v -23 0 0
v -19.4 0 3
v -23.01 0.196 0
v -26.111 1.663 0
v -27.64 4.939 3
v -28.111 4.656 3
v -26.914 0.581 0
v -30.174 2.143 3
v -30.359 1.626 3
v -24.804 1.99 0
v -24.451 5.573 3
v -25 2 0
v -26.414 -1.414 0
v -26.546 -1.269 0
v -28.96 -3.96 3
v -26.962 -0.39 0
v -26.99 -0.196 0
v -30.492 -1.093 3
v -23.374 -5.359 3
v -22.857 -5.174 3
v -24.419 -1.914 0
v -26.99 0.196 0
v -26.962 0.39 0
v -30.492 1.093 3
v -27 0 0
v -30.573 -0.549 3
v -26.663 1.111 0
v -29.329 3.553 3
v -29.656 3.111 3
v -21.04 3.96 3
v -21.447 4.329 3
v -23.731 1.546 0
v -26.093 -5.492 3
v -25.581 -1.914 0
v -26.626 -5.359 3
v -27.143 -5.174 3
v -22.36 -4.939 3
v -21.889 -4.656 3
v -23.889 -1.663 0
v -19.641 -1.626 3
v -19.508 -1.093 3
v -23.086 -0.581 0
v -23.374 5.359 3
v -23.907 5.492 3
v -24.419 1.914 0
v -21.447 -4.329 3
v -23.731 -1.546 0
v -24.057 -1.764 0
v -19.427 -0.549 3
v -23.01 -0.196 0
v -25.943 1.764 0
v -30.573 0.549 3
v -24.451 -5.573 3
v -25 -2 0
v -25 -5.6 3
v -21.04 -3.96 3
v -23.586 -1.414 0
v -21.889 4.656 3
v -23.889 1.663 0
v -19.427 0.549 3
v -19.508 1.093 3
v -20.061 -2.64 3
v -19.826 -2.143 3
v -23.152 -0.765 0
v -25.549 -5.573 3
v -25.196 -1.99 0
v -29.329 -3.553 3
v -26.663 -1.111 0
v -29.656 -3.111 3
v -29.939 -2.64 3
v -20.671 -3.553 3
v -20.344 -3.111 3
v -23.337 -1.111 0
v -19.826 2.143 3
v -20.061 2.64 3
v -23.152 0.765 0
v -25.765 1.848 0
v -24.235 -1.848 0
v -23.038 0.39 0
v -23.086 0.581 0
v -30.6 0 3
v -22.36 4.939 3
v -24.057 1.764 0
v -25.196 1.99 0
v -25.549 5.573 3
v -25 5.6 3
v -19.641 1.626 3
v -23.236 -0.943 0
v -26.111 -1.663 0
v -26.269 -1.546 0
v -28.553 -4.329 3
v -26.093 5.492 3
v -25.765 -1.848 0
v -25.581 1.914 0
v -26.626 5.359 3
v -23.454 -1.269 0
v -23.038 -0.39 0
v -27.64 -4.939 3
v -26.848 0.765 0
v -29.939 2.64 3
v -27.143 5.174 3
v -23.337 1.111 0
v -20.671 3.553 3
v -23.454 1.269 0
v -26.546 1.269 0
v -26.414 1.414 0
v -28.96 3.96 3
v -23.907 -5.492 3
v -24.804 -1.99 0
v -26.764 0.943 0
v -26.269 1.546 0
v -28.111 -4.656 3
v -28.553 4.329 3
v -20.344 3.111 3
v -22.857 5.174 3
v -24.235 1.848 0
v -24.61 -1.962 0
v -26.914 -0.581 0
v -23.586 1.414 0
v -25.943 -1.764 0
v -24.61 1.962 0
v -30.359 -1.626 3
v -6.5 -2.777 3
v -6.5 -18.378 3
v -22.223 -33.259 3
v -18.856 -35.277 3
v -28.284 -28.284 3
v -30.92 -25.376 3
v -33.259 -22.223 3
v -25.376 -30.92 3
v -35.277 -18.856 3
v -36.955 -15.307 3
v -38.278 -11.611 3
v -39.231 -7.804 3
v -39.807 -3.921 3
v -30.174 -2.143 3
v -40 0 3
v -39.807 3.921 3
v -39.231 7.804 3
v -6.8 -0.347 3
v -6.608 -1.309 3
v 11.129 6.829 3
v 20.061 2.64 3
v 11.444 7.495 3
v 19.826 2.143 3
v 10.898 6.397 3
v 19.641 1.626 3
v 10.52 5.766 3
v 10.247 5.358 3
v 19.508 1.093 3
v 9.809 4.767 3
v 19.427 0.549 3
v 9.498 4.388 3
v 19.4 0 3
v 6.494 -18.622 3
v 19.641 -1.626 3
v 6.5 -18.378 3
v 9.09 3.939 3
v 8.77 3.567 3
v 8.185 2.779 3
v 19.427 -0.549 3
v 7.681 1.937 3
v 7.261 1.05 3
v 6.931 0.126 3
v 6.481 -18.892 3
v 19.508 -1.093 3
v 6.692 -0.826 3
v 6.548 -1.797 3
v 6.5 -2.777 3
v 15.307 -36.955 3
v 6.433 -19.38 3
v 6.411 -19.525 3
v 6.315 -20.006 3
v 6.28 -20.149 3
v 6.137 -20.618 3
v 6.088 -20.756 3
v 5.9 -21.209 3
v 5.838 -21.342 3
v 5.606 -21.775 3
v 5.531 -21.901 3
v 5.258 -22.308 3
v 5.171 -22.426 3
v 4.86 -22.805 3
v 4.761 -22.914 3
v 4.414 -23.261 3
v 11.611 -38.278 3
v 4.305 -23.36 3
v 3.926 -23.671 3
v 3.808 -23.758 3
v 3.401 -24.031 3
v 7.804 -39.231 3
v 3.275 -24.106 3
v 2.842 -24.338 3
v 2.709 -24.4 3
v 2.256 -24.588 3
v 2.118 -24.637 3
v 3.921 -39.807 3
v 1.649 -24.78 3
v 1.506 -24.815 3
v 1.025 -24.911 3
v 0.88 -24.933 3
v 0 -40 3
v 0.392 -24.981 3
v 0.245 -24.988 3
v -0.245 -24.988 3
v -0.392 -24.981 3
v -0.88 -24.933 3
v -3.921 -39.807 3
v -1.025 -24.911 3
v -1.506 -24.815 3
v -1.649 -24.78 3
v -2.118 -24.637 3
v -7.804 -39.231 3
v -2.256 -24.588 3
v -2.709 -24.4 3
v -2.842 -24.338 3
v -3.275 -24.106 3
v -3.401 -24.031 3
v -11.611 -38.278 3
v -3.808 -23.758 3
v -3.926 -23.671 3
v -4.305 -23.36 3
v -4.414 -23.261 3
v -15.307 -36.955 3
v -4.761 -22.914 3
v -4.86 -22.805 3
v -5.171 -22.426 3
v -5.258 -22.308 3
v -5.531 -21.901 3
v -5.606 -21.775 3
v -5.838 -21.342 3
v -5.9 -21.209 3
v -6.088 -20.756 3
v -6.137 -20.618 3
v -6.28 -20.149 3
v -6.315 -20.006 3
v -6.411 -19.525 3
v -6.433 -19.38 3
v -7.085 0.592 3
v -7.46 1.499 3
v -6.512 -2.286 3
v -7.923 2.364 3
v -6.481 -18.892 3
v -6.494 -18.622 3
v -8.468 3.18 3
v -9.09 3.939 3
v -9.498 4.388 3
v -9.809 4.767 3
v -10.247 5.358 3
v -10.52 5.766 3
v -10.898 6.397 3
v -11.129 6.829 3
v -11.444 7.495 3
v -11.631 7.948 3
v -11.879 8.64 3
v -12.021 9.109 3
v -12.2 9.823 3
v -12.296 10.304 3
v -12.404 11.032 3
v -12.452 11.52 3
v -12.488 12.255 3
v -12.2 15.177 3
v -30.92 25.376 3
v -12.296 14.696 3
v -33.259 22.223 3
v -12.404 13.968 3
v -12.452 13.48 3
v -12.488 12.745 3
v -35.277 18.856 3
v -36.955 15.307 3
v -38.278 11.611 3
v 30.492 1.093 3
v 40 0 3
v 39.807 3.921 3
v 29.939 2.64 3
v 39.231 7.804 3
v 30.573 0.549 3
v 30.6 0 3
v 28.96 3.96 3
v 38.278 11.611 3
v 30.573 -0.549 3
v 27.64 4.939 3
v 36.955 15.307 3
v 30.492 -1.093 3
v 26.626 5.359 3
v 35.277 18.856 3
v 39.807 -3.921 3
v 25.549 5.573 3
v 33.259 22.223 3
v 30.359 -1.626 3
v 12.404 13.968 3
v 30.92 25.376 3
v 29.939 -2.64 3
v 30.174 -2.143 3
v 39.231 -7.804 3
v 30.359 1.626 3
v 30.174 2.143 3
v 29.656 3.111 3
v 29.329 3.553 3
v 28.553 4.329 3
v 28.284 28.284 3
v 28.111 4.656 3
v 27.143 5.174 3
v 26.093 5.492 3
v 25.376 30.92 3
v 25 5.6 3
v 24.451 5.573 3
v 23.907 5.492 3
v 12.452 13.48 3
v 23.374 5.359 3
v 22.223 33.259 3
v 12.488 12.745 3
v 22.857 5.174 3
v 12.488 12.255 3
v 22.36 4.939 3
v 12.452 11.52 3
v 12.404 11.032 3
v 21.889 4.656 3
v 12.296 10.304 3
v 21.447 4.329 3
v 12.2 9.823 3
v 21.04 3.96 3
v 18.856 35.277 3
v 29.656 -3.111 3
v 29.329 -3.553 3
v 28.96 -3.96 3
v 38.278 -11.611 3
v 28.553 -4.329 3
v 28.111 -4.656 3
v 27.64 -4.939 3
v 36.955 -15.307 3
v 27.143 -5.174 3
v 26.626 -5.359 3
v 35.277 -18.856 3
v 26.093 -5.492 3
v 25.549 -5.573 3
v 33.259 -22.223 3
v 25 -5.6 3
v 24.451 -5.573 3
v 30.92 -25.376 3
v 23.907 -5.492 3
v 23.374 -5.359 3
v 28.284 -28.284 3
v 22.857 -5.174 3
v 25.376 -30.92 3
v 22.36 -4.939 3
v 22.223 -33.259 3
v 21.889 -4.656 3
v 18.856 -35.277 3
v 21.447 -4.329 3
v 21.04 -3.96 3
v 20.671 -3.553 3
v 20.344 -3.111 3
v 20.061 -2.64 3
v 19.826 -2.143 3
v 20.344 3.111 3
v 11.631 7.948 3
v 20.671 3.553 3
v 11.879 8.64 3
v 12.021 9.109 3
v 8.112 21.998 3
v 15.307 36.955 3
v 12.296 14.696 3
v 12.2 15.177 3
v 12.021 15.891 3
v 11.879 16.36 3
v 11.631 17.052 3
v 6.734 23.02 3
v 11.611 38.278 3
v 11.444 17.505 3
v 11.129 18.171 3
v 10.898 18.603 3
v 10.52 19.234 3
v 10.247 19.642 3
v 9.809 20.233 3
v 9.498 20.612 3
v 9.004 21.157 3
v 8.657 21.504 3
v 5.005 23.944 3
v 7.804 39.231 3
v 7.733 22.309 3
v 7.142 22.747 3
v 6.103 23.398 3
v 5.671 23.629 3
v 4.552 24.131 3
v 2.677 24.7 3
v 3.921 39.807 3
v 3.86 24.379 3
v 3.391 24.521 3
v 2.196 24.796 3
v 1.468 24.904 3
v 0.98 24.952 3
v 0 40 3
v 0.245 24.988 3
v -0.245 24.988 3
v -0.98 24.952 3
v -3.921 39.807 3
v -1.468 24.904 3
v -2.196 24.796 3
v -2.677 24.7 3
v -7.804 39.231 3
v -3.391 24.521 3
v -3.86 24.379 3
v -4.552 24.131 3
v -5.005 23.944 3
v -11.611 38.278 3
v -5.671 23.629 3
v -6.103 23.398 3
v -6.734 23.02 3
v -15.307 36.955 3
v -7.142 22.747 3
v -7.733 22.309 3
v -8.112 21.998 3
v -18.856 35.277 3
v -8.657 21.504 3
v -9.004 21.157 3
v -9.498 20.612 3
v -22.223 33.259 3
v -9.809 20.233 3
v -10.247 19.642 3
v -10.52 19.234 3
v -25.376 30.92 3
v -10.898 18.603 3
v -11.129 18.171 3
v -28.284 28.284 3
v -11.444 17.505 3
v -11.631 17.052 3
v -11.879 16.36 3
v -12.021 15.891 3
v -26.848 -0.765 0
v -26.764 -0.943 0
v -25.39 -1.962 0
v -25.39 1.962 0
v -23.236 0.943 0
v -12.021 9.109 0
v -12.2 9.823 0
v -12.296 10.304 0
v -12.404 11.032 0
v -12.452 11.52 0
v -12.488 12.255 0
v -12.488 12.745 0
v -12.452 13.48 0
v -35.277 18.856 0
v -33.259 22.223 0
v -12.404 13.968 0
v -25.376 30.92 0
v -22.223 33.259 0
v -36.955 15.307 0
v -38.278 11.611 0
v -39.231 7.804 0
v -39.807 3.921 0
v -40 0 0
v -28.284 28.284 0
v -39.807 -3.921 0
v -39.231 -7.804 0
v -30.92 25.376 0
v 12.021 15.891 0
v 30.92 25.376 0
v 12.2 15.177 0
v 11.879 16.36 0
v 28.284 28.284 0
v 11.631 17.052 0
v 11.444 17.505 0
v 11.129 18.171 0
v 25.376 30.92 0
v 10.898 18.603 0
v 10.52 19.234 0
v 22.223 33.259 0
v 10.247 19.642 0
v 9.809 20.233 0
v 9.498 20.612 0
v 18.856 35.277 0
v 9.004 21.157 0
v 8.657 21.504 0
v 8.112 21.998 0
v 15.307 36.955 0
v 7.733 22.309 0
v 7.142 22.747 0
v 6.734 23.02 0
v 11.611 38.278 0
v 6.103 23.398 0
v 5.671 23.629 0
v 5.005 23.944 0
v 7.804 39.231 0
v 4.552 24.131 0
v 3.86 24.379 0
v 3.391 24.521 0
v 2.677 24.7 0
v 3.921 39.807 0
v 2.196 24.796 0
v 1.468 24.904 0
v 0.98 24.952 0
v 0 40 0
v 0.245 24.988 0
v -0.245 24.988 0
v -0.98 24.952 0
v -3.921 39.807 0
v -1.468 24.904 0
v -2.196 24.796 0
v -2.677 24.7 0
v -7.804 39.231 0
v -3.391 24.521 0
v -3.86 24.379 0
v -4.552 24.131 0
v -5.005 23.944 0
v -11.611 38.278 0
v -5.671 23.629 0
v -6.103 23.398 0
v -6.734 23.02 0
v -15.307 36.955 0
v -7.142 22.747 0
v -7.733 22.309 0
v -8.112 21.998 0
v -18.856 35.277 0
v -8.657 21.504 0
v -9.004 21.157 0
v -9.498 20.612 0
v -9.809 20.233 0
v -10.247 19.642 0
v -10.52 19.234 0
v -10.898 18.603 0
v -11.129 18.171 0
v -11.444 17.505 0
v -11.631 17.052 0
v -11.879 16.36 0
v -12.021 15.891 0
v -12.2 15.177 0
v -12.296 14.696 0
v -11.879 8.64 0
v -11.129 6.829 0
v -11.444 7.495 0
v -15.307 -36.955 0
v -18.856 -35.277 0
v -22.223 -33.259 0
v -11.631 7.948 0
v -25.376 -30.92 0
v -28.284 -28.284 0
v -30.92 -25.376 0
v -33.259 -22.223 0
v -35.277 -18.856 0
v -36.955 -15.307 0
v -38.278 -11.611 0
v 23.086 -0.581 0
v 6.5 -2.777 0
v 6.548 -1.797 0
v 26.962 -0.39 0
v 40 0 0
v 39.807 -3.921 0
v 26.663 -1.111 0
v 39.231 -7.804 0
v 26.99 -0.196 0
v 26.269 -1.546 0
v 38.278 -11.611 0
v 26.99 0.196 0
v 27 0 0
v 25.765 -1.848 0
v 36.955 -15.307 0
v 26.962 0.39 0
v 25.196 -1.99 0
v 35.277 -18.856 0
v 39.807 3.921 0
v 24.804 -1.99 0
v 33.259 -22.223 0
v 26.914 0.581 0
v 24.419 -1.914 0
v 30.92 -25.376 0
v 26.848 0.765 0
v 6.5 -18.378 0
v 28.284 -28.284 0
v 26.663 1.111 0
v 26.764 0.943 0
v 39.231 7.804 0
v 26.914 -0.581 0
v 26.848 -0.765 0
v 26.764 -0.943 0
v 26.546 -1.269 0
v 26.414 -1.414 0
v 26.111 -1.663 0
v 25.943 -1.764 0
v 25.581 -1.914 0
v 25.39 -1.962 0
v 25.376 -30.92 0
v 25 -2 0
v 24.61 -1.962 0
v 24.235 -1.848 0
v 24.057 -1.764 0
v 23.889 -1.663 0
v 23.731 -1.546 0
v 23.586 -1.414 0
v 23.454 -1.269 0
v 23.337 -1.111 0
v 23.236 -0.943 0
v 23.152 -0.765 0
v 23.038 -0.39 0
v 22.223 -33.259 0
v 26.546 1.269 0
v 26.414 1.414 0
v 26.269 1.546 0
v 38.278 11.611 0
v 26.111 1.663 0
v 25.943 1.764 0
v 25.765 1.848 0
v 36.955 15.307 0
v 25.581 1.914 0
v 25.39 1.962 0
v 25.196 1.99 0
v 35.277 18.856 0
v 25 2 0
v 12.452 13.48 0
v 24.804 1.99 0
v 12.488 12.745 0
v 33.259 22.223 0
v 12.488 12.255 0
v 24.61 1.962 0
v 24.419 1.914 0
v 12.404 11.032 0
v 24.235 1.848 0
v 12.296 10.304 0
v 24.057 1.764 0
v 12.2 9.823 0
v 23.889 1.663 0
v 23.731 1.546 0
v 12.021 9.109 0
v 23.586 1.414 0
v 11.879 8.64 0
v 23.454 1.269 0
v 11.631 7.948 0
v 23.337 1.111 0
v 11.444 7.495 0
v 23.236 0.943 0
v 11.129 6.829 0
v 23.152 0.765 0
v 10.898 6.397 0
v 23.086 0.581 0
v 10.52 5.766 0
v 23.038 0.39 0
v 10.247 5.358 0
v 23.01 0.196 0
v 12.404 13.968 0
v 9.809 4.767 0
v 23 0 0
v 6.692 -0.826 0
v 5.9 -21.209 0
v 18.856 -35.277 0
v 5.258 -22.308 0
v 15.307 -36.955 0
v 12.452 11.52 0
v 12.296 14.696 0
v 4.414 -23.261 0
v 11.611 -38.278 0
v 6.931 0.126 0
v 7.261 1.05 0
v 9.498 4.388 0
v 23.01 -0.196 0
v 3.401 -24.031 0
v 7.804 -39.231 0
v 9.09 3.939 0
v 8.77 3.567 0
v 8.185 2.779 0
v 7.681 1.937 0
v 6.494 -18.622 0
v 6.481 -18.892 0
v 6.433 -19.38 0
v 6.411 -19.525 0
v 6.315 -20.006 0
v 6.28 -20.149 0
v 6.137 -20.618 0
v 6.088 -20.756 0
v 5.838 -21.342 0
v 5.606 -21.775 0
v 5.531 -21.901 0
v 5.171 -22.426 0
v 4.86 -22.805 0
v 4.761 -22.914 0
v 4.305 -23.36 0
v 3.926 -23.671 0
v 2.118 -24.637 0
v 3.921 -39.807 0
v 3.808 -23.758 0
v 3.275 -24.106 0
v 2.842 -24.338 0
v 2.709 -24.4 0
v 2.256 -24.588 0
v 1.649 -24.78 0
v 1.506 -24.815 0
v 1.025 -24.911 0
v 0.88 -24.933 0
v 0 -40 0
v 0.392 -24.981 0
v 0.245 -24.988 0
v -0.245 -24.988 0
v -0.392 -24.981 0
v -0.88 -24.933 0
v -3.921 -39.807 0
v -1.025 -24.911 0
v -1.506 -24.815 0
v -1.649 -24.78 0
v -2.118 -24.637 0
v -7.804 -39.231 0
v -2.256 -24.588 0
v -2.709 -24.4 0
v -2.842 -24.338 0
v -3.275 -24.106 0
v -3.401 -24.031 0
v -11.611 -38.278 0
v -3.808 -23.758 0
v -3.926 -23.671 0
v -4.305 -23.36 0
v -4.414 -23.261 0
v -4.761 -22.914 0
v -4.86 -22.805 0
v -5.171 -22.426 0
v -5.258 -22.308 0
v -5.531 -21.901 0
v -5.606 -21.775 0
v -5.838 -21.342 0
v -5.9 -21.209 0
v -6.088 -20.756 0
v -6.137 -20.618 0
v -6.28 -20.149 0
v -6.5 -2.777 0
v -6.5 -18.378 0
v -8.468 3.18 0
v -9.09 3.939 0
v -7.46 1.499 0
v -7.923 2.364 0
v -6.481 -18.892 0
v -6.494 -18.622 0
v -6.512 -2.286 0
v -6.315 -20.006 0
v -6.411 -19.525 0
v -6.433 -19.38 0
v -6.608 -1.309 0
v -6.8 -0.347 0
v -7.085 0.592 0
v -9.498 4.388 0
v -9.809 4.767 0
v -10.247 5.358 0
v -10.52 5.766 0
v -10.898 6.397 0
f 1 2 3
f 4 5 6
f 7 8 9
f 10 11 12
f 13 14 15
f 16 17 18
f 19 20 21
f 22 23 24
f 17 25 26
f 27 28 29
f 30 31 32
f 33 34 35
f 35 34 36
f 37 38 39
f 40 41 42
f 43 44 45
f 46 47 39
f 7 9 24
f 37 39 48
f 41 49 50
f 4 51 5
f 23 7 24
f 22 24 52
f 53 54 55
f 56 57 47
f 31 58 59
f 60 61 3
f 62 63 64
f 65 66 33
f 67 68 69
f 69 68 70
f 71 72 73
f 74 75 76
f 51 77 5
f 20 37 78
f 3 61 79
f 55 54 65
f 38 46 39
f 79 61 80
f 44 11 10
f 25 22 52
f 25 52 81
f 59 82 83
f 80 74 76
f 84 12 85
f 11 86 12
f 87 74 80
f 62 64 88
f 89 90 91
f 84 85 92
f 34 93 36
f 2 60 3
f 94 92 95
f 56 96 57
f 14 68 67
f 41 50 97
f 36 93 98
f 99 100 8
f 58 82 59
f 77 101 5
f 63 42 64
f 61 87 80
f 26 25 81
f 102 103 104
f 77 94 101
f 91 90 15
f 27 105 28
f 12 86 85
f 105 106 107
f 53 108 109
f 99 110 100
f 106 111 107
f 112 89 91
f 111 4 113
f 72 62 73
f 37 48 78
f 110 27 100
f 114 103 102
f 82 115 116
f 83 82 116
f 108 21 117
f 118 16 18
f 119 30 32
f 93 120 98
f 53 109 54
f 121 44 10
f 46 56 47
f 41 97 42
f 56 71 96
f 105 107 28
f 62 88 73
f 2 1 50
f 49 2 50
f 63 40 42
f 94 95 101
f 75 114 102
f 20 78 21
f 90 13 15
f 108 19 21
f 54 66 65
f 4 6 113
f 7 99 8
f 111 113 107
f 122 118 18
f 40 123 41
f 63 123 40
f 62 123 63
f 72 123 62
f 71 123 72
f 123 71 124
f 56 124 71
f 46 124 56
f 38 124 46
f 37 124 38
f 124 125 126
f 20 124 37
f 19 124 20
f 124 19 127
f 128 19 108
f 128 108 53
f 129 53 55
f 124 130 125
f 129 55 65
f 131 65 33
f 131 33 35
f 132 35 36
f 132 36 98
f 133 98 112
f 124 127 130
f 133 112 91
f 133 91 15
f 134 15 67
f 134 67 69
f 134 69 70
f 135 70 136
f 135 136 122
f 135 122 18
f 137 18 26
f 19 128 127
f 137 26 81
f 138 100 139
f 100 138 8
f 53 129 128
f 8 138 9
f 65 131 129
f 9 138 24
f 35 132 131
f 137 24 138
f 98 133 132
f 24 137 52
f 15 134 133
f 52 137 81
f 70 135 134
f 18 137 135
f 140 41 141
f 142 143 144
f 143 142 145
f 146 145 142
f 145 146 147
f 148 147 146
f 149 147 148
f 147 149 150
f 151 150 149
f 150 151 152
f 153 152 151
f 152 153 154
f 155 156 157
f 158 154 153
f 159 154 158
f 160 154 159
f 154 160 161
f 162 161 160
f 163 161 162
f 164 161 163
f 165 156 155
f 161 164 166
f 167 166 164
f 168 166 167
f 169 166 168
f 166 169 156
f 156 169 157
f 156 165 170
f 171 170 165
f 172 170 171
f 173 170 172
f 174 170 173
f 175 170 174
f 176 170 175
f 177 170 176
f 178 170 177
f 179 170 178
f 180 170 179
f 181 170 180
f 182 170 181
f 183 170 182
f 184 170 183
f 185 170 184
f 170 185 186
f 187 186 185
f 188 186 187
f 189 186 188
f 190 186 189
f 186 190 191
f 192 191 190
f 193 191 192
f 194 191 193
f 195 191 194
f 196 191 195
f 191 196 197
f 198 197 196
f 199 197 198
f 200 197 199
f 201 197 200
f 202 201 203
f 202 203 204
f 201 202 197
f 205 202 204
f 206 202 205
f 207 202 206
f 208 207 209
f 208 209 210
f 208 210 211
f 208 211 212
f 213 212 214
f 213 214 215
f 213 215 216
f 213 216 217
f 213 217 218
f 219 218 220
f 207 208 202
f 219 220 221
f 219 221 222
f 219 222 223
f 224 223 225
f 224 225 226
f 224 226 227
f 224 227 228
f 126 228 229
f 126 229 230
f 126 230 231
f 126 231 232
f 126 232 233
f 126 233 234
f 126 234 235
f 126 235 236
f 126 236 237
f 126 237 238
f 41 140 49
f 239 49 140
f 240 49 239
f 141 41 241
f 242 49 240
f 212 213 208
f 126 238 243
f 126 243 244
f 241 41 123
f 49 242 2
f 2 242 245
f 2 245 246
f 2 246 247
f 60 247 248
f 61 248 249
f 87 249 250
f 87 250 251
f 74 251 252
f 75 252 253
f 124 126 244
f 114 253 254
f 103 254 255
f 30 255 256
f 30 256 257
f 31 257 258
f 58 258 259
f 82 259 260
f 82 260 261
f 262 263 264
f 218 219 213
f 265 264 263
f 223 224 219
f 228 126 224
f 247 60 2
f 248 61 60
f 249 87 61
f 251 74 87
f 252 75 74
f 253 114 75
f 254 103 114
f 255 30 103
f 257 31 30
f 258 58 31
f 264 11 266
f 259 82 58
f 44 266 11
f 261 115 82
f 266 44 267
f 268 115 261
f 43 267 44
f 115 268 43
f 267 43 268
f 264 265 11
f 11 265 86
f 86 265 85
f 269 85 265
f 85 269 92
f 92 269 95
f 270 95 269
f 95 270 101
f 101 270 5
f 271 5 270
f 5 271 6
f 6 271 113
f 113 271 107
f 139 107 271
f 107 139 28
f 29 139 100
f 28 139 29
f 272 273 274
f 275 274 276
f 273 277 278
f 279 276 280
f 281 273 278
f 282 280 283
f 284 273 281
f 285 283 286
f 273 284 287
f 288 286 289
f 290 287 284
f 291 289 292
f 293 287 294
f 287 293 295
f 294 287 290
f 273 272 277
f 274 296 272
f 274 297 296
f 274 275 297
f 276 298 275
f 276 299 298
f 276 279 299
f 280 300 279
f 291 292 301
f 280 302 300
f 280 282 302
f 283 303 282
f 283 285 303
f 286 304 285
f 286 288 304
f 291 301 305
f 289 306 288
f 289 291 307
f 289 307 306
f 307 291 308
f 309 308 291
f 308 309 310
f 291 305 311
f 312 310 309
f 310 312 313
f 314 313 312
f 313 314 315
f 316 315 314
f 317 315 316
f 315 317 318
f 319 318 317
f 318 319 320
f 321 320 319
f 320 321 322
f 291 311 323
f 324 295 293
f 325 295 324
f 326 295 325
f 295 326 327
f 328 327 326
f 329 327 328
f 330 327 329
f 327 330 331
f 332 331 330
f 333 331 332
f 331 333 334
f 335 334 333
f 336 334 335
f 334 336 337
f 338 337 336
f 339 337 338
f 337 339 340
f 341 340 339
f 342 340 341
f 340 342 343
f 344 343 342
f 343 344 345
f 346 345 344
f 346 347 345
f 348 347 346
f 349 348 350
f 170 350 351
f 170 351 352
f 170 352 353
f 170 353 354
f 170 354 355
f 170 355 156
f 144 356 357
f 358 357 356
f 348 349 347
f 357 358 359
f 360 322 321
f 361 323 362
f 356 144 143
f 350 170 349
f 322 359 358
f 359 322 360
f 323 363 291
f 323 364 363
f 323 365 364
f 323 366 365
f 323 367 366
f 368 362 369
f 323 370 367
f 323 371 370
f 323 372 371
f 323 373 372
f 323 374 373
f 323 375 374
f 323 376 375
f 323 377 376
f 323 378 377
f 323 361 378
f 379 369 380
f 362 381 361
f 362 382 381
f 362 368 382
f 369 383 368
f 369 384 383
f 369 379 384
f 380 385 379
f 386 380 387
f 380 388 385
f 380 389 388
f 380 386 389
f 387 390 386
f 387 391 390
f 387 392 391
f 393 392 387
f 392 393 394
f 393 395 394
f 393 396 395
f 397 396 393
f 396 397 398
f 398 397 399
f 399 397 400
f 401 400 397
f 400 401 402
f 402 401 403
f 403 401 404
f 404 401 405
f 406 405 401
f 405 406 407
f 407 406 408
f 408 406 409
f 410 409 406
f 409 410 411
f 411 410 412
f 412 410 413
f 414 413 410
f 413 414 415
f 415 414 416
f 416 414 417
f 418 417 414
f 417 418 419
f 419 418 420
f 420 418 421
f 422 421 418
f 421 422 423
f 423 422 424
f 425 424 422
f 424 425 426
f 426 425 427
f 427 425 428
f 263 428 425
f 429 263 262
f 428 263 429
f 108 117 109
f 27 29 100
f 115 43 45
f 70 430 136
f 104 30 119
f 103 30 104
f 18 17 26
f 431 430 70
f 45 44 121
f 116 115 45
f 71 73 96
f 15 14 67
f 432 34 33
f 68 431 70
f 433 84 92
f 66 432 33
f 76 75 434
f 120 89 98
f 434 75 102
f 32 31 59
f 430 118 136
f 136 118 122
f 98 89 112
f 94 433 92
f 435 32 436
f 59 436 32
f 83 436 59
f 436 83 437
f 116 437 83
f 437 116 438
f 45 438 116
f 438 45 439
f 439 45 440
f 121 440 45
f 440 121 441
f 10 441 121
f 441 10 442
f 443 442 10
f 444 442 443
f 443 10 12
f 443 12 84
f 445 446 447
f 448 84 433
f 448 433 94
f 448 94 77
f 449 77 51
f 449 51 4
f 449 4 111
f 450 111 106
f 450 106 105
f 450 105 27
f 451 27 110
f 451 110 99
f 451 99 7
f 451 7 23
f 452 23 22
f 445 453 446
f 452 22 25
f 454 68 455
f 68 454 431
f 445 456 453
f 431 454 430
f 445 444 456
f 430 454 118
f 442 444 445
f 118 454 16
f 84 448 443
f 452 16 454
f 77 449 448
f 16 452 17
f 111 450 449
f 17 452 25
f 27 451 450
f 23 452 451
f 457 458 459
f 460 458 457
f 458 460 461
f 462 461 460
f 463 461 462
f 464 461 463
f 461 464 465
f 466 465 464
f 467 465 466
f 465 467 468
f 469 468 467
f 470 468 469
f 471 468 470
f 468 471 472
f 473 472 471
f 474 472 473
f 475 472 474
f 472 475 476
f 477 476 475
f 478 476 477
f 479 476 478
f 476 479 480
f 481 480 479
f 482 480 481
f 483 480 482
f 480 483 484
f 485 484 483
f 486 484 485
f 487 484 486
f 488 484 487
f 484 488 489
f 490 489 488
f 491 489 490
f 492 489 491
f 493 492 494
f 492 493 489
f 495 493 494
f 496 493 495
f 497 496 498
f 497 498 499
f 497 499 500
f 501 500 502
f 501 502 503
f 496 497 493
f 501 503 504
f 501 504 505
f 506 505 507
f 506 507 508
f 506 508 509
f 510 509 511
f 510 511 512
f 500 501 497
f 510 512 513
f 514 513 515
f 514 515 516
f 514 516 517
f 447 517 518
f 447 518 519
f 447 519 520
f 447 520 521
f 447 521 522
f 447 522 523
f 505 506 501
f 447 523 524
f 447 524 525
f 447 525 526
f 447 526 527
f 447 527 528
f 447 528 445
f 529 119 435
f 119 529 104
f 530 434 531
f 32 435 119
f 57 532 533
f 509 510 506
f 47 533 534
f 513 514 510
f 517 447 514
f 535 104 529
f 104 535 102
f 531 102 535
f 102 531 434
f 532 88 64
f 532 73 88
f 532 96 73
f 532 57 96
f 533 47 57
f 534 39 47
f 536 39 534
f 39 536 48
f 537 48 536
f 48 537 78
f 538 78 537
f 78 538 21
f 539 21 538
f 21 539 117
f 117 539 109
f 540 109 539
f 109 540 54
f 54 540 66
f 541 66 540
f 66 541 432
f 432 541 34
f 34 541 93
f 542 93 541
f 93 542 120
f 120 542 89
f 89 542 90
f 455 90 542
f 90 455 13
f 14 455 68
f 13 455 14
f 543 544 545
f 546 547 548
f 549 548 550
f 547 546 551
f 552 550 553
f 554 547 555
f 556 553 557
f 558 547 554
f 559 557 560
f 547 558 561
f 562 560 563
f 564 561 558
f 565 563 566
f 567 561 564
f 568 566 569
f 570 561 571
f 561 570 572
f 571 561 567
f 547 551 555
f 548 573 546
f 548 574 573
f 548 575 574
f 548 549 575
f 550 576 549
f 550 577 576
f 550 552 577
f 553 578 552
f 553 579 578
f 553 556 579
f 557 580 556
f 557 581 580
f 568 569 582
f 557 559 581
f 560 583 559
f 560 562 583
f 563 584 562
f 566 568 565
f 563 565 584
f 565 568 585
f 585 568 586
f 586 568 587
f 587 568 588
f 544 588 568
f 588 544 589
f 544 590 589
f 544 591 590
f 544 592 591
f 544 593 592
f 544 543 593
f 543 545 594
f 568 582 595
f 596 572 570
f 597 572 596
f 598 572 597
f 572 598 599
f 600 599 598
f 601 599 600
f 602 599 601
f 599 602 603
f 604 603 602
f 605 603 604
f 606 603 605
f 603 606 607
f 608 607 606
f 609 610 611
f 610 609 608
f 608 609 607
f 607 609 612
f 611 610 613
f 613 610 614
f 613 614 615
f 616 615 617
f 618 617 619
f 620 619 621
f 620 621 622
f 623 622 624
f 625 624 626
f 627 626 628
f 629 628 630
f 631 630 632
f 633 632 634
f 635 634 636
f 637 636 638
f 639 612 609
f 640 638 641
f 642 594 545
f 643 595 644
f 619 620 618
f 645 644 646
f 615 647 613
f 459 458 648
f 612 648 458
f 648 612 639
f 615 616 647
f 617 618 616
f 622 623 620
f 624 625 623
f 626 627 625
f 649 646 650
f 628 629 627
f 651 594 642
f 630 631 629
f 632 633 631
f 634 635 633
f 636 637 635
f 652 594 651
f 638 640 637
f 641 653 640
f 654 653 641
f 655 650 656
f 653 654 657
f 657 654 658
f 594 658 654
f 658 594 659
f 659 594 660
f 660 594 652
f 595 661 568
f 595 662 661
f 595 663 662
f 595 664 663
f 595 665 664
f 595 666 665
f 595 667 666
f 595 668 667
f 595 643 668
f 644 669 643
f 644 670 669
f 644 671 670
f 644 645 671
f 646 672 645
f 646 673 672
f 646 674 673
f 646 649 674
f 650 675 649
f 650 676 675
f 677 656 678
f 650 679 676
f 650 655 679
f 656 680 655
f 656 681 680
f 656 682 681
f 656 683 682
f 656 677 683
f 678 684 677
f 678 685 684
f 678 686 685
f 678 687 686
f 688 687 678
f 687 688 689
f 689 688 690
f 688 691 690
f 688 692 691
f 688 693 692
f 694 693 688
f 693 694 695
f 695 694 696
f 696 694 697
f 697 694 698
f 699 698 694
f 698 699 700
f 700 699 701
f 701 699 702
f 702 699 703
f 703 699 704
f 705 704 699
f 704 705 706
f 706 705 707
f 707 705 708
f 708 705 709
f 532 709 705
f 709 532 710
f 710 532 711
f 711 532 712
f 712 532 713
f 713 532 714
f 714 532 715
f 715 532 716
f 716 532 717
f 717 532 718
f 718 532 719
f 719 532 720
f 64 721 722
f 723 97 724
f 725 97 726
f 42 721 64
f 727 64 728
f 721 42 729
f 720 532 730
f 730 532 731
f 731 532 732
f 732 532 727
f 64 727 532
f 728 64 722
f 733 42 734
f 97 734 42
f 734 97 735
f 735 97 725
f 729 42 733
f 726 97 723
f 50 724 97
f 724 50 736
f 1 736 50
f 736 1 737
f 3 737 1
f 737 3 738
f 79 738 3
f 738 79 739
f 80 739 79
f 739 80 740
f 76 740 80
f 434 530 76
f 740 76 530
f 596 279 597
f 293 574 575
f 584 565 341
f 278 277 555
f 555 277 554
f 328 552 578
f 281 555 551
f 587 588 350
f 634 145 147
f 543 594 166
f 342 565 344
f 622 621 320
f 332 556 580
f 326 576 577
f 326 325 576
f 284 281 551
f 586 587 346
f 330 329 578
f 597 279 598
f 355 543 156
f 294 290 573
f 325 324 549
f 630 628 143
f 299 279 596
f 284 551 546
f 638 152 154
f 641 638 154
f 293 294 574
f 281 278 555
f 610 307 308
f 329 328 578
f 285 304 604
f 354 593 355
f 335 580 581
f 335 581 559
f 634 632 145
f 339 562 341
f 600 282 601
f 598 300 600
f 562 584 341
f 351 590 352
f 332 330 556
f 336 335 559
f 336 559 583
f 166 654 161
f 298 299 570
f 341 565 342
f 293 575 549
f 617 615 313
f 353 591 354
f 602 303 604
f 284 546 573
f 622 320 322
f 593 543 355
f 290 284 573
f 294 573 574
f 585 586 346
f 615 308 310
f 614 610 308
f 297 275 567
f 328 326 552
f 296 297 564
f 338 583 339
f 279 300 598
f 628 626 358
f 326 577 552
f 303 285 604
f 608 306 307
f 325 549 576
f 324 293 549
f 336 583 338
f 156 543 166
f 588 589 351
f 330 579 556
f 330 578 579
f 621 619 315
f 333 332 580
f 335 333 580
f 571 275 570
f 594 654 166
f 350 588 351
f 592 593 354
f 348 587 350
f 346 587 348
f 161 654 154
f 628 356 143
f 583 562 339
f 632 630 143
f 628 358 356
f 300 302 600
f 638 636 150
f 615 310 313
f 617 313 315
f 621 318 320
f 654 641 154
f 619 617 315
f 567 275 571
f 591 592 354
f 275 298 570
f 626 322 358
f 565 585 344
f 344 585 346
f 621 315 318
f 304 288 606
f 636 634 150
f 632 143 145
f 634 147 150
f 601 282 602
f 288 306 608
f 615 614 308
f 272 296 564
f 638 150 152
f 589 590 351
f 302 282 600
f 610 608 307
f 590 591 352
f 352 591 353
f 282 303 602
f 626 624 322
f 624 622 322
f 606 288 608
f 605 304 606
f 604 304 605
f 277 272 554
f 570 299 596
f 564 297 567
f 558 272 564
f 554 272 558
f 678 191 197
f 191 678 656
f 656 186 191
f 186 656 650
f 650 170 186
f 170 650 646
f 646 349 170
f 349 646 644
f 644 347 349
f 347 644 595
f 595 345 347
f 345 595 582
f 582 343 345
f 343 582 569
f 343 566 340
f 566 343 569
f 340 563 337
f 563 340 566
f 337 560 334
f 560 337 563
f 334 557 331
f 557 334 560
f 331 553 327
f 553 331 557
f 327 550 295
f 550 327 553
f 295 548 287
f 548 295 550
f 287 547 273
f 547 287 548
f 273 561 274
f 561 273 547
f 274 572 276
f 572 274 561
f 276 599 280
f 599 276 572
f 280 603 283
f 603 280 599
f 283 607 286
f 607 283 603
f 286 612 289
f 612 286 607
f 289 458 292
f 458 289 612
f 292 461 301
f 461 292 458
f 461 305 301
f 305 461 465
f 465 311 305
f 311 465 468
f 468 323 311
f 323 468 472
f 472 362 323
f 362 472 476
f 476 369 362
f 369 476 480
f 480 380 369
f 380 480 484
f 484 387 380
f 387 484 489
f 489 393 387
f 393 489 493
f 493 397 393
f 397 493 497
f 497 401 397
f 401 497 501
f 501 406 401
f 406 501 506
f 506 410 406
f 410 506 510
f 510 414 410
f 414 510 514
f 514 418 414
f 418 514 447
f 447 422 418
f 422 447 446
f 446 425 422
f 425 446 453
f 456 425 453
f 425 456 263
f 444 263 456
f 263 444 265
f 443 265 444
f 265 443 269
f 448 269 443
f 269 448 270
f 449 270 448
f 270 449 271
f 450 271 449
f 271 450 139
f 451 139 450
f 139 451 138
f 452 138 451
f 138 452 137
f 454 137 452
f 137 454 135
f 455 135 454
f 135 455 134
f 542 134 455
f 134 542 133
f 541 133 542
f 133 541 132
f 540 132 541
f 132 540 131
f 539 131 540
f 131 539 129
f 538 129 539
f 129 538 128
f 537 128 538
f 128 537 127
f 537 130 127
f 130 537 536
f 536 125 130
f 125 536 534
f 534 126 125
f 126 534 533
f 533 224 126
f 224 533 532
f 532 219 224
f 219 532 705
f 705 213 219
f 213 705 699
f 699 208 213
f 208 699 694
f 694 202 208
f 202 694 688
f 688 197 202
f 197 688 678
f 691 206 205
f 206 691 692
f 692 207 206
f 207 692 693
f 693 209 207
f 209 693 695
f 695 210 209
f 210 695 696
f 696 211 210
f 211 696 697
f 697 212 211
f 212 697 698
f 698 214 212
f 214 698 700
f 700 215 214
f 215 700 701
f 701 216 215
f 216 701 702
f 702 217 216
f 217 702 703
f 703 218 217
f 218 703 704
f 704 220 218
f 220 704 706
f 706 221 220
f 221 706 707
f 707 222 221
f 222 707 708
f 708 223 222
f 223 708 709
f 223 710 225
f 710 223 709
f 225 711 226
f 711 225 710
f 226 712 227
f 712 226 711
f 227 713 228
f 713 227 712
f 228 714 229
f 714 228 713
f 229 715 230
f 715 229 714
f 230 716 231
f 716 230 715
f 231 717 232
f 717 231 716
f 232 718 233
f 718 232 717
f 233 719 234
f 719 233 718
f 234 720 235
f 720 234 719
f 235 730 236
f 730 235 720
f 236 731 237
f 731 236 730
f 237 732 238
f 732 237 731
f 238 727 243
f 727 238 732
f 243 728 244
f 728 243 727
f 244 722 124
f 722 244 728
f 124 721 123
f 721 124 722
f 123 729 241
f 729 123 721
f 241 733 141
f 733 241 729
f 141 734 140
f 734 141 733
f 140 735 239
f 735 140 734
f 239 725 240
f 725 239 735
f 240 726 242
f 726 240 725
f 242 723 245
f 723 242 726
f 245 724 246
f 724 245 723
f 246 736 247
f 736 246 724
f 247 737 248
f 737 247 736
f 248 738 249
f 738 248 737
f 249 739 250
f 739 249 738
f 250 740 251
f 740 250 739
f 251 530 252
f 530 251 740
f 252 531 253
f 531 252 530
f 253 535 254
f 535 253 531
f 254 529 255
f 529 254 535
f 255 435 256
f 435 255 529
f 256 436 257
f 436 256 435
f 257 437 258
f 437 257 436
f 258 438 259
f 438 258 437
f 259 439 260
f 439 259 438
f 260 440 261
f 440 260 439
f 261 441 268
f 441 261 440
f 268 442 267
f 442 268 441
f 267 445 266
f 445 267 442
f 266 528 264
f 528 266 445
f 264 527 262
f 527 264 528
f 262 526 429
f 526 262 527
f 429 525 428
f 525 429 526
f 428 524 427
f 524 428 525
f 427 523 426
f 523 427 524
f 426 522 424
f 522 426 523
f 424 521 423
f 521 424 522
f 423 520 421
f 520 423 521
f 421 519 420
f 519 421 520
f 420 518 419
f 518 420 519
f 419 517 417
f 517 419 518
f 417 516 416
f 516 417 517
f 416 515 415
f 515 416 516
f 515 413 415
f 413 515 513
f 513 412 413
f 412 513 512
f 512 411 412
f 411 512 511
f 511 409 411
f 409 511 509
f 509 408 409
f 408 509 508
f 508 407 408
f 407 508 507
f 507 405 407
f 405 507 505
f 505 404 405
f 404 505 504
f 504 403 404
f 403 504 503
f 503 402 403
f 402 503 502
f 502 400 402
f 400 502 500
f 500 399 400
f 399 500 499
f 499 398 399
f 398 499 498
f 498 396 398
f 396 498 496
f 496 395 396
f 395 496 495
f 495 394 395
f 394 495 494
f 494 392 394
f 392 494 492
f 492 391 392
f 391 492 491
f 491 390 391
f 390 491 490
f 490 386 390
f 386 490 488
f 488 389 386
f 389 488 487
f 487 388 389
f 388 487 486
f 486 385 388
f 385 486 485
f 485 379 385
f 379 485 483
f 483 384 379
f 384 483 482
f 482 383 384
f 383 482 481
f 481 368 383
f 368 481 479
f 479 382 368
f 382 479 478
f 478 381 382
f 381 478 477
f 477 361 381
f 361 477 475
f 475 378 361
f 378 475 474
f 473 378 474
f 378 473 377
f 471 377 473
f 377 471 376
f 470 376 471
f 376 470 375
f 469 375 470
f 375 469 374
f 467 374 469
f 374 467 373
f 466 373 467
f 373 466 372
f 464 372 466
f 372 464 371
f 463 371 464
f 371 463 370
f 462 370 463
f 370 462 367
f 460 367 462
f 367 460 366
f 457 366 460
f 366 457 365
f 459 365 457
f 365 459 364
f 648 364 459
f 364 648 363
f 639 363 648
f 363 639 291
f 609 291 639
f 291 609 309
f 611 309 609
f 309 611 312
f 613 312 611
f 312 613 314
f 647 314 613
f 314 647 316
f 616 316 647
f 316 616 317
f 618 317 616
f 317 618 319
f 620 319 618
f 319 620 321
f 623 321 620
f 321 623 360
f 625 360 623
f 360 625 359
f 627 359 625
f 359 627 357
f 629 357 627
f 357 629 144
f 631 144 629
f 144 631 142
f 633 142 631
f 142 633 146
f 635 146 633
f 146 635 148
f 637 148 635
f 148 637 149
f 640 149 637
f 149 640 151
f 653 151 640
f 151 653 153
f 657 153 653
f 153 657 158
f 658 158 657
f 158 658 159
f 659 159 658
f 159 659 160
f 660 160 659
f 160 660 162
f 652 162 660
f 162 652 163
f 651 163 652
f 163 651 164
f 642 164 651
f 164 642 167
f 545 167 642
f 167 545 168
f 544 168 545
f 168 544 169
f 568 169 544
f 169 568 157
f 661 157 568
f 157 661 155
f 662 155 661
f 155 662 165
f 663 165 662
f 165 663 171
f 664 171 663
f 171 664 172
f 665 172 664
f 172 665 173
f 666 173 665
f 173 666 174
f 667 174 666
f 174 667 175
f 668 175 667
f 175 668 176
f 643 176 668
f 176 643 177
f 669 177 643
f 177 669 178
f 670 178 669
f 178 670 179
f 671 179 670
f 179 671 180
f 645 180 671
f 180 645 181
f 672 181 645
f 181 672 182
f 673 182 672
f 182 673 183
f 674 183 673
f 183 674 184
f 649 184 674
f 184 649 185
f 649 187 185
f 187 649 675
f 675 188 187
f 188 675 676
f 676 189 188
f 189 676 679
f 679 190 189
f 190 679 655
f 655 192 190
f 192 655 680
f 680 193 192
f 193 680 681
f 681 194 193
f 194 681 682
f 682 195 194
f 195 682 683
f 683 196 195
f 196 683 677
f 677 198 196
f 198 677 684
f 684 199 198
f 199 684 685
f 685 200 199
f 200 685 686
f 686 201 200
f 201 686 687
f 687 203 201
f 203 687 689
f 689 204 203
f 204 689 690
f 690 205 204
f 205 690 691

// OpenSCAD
Epaisseur = 3;
Diametre_general = 80;
Trou_clef_Hauteur = 50;
Trou_clef_diametre_1 = 25;
Trou_clef_diametre_2 = 13;
Trou_clef_arrondi = 10;

Vis_espacement=50;
Vis_diametre=4;
Force_vis_conique=60;

difference()
{
    linear_extrude(Epaisseur)
    difference()
    {
        circle(d=Diametre_general,$fn=64);
        offset(-Trou_clef_arrondi,$fn=64)
        offset(Trou_clef_arrondi,$fn=64)
        {
            translate([0,Trou_clef_Hauteur/2-Trou_clef_diametre_1/2,0])
            circle(d=Trou_clef_diametre_1,$fn=64);
            hull()
            {    
                translate([0,-Trou_clef_Hauteur/2+Trou_clef_diametre_2/2,0])
                circle(d=Trou_clef_diametre_2,$fn=64);
                translate([0,Trou_clef_Hauteur/2-Trou_clef_diametre_1/2,0])
                circle(d=Trou_clef_diametre_2,$fn=64);
            }   
        }
    }
    for(i=[-1,1])
    {
    translate([i*Vis_espacement/2,0,0])

    cylinder(d1=Vis_diametre,d2=Vis_diametre+(Vis_diametre*Epaisseur*Force_vis_conique/100),h=Epaisseur,$fn=64);
        
        
    
    }

}
